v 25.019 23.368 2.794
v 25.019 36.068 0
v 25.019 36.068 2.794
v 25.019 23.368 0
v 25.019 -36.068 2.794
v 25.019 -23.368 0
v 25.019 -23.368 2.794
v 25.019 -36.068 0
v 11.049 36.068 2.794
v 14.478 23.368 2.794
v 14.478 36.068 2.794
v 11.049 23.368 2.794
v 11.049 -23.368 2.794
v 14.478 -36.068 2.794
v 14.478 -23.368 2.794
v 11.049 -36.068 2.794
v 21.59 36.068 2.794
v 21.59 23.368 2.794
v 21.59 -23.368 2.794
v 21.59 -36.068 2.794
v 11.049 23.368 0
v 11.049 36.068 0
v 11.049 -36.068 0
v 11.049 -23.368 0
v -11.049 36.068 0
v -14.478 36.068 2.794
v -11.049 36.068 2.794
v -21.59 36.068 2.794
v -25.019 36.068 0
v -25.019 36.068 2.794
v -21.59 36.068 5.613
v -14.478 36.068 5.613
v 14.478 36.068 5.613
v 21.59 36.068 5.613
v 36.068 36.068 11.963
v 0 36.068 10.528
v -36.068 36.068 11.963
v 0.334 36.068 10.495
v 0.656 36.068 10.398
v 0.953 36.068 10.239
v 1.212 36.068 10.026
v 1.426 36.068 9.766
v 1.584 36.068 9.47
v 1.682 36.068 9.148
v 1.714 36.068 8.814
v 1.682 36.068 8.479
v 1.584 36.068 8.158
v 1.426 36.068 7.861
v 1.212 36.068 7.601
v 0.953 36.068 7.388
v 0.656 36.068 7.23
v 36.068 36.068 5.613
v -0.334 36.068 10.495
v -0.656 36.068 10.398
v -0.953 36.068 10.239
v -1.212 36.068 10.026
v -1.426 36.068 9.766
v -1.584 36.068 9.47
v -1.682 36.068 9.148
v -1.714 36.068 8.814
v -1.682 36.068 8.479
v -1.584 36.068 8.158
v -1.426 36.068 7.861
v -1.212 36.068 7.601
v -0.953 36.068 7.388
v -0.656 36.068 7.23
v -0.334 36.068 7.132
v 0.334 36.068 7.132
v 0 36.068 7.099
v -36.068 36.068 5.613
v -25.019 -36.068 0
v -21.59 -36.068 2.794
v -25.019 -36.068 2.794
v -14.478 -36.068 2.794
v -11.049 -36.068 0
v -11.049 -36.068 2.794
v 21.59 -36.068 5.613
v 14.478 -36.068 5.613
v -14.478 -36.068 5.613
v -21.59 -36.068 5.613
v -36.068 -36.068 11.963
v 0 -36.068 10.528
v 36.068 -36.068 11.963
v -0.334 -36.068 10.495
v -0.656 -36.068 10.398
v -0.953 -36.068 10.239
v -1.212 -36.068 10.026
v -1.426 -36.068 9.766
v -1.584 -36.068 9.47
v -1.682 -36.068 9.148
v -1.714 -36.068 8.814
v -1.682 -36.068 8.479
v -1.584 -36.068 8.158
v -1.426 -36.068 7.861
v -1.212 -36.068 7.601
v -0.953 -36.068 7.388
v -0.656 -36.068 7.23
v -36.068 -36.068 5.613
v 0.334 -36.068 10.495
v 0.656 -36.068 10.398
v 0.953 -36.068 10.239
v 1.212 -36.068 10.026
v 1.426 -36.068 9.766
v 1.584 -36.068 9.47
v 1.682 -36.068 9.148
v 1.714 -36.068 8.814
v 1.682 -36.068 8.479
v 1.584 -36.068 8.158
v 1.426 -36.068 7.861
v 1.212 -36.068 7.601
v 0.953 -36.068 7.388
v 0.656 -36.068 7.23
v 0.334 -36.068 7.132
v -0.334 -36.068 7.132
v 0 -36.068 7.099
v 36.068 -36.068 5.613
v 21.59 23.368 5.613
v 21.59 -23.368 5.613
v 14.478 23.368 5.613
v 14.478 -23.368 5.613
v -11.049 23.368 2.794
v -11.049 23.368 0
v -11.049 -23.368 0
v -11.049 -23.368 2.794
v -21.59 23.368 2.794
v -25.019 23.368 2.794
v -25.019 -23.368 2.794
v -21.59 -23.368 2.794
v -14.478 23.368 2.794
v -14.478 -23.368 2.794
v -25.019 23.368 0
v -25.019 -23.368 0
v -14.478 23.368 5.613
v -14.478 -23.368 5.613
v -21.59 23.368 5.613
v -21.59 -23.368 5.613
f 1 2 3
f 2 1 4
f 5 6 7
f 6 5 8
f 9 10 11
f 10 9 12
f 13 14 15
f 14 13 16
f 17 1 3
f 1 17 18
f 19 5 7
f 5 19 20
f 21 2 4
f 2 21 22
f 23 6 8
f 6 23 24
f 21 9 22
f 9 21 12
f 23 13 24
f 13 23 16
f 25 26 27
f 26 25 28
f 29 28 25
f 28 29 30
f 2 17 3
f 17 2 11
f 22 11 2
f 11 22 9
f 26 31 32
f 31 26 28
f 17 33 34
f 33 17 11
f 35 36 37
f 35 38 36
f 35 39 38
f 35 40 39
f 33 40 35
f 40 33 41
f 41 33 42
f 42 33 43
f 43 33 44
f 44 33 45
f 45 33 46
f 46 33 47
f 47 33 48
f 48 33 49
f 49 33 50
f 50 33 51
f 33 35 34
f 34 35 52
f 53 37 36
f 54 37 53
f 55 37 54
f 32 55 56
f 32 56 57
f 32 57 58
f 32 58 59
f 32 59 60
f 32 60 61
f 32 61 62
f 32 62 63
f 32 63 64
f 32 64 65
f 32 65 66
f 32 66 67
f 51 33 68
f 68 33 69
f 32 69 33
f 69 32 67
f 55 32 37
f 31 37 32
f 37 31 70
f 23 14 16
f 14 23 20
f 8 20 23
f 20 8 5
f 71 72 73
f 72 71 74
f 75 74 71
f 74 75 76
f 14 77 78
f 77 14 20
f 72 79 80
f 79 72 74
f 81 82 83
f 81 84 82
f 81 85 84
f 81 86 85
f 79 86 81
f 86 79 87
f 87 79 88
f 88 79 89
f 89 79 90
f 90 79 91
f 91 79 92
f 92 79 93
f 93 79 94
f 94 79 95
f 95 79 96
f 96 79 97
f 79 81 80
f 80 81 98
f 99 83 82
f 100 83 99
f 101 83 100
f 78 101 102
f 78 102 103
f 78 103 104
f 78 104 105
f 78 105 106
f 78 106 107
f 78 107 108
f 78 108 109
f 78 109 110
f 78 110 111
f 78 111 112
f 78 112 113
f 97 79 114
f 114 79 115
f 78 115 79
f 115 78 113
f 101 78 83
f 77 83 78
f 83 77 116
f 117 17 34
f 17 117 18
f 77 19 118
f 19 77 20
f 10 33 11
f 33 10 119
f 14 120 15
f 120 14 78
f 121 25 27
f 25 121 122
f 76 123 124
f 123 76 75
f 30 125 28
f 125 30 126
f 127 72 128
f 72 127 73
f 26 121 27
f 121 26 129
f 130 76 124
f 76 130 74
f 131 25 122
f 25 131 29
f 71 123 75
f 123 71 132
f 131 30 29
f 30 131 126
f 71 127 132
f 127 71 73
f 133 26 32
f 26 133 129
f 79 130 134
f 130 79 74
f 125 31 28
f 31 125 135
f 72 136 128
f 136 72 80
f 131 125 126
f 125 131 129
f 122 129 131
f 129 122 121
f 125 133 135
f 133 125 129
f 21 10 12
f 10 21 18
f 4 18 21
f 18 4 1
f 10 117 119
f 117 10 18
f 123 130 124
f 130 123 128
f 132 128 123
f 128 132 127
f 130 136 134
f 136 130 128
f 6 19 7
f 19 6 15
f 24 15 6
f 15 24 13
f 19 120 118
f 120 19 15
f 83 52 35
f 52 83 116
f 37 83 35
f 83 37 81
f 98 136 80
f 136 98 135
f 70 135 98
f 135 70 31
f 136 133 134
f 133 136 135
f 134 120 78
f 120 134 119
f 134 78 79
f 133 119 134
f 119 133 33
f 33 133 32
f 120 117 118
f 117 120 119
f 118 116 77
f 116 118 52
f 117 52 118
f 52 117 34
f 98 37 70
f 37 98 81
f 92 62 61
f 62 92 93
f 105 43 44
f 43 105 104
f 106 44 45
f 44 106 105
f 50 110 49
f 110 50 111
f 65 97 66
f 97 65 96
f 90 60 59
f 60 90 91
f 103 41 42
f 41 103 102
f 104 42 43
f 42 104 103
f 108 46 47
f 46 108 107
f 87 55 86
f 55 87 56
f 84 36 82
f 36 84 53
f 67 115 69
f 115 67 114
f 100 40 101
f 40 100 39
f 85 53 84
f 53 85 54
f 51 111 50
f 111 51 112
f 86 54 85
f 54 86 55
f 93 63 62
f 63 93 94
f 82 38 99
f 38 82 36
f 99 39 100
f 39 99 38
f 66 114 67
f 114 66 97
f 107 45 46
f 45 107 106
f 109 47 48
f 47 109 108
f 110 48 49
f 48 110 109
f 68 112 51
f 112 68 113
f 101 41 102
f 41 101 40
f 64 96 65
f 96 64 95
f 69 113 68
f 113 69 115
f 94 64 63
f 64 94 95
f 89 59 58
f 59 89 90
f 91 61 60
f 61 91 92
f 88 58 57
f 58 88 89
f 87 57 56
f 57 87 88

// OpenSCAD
// file: Common.scad
// All dimensions in inches


$fn=32;

FlaviaOH = 0.185;
FlaviaIH = 0.11;
FlaviaOW = 0.71;
FlaviaIW = 0.55;
FlaviaSlotW = 0.28;
FlaviaMatThick = 0.032;

BaseW = FlaviaOW * 4;
// for Test
BaseL = BaseW;
//BaseL = 0.5;
BaseT = 0.25;

RiserW = BaseW * 0.25;
RiserD = 0.25;
RiserScrewHole = 0.135; // oversize for 0.1285

RiserScrewSlotW = 0.2;
RiserScrewSlotD = 0.2;
RiserScrewHeadDia = 0.25; // panhead 

SlotZ = BaseT - FlaviaOH + FlaviaMatThick;   

TeeH = 1.2 * FlaviaOH; // just to say

// When sitting in slide
SlideHeight = SlotZ + FlaviaMatThick + TeeH + BaseT;
RiserH = SlideHeight;
RiserLeadScrewCenter = RiserH - (BaseT * 0.5);
SlideLeadScrewCenter = SlideHeight - (SlotZ + FlaviaMatThick) - (BaseT * 0.5);

SlotSp = FlaviaOW;
// main file
include <Common.scad>


module SlideBlock() {
   translate([0,0,0.5*BaseT]) cube([BaseW, BaseL, BaseT], center=true);
}

module Tee() {
  // fits in the flavia stick slot
  union() {
    translate([0,0,0.5* FlaviaIH]) cube([FlaviaIW, BaseL, FlaviaIH], center=true);
    translate([0,0,0.5*TeeH]) cube([FlaviaSlotW, BaseL, TeeH], center=true);
  }
}

module TeePair() {
  difference() {
    union() {
      translate([SlotSp * 1, 0, 0]) Tee();
      translate([-SlotSp * 1, 0, 0]) Tee();
    }
    cube([BaseW, BaseL - 1.0,3*TeeH], center=true);
  }	
}

 
module LeadScrewHole() {
  translate([0,0,SlideLeadScrewCenter]) 
    rotate([90,0,0])
      cylinder(d=RiserScrewHole,h=2*BaseL, center=true);
}

module Slide() {
  difference() {
     union() {
       translate([0,0,TeeH - 0.001]) SlideBlock();	        
       TeePair();
     }
     LeadScrewHole();
  }
}

scale([25.4,25.4,25.4]) {
  Slide();
//  Tee();
}
